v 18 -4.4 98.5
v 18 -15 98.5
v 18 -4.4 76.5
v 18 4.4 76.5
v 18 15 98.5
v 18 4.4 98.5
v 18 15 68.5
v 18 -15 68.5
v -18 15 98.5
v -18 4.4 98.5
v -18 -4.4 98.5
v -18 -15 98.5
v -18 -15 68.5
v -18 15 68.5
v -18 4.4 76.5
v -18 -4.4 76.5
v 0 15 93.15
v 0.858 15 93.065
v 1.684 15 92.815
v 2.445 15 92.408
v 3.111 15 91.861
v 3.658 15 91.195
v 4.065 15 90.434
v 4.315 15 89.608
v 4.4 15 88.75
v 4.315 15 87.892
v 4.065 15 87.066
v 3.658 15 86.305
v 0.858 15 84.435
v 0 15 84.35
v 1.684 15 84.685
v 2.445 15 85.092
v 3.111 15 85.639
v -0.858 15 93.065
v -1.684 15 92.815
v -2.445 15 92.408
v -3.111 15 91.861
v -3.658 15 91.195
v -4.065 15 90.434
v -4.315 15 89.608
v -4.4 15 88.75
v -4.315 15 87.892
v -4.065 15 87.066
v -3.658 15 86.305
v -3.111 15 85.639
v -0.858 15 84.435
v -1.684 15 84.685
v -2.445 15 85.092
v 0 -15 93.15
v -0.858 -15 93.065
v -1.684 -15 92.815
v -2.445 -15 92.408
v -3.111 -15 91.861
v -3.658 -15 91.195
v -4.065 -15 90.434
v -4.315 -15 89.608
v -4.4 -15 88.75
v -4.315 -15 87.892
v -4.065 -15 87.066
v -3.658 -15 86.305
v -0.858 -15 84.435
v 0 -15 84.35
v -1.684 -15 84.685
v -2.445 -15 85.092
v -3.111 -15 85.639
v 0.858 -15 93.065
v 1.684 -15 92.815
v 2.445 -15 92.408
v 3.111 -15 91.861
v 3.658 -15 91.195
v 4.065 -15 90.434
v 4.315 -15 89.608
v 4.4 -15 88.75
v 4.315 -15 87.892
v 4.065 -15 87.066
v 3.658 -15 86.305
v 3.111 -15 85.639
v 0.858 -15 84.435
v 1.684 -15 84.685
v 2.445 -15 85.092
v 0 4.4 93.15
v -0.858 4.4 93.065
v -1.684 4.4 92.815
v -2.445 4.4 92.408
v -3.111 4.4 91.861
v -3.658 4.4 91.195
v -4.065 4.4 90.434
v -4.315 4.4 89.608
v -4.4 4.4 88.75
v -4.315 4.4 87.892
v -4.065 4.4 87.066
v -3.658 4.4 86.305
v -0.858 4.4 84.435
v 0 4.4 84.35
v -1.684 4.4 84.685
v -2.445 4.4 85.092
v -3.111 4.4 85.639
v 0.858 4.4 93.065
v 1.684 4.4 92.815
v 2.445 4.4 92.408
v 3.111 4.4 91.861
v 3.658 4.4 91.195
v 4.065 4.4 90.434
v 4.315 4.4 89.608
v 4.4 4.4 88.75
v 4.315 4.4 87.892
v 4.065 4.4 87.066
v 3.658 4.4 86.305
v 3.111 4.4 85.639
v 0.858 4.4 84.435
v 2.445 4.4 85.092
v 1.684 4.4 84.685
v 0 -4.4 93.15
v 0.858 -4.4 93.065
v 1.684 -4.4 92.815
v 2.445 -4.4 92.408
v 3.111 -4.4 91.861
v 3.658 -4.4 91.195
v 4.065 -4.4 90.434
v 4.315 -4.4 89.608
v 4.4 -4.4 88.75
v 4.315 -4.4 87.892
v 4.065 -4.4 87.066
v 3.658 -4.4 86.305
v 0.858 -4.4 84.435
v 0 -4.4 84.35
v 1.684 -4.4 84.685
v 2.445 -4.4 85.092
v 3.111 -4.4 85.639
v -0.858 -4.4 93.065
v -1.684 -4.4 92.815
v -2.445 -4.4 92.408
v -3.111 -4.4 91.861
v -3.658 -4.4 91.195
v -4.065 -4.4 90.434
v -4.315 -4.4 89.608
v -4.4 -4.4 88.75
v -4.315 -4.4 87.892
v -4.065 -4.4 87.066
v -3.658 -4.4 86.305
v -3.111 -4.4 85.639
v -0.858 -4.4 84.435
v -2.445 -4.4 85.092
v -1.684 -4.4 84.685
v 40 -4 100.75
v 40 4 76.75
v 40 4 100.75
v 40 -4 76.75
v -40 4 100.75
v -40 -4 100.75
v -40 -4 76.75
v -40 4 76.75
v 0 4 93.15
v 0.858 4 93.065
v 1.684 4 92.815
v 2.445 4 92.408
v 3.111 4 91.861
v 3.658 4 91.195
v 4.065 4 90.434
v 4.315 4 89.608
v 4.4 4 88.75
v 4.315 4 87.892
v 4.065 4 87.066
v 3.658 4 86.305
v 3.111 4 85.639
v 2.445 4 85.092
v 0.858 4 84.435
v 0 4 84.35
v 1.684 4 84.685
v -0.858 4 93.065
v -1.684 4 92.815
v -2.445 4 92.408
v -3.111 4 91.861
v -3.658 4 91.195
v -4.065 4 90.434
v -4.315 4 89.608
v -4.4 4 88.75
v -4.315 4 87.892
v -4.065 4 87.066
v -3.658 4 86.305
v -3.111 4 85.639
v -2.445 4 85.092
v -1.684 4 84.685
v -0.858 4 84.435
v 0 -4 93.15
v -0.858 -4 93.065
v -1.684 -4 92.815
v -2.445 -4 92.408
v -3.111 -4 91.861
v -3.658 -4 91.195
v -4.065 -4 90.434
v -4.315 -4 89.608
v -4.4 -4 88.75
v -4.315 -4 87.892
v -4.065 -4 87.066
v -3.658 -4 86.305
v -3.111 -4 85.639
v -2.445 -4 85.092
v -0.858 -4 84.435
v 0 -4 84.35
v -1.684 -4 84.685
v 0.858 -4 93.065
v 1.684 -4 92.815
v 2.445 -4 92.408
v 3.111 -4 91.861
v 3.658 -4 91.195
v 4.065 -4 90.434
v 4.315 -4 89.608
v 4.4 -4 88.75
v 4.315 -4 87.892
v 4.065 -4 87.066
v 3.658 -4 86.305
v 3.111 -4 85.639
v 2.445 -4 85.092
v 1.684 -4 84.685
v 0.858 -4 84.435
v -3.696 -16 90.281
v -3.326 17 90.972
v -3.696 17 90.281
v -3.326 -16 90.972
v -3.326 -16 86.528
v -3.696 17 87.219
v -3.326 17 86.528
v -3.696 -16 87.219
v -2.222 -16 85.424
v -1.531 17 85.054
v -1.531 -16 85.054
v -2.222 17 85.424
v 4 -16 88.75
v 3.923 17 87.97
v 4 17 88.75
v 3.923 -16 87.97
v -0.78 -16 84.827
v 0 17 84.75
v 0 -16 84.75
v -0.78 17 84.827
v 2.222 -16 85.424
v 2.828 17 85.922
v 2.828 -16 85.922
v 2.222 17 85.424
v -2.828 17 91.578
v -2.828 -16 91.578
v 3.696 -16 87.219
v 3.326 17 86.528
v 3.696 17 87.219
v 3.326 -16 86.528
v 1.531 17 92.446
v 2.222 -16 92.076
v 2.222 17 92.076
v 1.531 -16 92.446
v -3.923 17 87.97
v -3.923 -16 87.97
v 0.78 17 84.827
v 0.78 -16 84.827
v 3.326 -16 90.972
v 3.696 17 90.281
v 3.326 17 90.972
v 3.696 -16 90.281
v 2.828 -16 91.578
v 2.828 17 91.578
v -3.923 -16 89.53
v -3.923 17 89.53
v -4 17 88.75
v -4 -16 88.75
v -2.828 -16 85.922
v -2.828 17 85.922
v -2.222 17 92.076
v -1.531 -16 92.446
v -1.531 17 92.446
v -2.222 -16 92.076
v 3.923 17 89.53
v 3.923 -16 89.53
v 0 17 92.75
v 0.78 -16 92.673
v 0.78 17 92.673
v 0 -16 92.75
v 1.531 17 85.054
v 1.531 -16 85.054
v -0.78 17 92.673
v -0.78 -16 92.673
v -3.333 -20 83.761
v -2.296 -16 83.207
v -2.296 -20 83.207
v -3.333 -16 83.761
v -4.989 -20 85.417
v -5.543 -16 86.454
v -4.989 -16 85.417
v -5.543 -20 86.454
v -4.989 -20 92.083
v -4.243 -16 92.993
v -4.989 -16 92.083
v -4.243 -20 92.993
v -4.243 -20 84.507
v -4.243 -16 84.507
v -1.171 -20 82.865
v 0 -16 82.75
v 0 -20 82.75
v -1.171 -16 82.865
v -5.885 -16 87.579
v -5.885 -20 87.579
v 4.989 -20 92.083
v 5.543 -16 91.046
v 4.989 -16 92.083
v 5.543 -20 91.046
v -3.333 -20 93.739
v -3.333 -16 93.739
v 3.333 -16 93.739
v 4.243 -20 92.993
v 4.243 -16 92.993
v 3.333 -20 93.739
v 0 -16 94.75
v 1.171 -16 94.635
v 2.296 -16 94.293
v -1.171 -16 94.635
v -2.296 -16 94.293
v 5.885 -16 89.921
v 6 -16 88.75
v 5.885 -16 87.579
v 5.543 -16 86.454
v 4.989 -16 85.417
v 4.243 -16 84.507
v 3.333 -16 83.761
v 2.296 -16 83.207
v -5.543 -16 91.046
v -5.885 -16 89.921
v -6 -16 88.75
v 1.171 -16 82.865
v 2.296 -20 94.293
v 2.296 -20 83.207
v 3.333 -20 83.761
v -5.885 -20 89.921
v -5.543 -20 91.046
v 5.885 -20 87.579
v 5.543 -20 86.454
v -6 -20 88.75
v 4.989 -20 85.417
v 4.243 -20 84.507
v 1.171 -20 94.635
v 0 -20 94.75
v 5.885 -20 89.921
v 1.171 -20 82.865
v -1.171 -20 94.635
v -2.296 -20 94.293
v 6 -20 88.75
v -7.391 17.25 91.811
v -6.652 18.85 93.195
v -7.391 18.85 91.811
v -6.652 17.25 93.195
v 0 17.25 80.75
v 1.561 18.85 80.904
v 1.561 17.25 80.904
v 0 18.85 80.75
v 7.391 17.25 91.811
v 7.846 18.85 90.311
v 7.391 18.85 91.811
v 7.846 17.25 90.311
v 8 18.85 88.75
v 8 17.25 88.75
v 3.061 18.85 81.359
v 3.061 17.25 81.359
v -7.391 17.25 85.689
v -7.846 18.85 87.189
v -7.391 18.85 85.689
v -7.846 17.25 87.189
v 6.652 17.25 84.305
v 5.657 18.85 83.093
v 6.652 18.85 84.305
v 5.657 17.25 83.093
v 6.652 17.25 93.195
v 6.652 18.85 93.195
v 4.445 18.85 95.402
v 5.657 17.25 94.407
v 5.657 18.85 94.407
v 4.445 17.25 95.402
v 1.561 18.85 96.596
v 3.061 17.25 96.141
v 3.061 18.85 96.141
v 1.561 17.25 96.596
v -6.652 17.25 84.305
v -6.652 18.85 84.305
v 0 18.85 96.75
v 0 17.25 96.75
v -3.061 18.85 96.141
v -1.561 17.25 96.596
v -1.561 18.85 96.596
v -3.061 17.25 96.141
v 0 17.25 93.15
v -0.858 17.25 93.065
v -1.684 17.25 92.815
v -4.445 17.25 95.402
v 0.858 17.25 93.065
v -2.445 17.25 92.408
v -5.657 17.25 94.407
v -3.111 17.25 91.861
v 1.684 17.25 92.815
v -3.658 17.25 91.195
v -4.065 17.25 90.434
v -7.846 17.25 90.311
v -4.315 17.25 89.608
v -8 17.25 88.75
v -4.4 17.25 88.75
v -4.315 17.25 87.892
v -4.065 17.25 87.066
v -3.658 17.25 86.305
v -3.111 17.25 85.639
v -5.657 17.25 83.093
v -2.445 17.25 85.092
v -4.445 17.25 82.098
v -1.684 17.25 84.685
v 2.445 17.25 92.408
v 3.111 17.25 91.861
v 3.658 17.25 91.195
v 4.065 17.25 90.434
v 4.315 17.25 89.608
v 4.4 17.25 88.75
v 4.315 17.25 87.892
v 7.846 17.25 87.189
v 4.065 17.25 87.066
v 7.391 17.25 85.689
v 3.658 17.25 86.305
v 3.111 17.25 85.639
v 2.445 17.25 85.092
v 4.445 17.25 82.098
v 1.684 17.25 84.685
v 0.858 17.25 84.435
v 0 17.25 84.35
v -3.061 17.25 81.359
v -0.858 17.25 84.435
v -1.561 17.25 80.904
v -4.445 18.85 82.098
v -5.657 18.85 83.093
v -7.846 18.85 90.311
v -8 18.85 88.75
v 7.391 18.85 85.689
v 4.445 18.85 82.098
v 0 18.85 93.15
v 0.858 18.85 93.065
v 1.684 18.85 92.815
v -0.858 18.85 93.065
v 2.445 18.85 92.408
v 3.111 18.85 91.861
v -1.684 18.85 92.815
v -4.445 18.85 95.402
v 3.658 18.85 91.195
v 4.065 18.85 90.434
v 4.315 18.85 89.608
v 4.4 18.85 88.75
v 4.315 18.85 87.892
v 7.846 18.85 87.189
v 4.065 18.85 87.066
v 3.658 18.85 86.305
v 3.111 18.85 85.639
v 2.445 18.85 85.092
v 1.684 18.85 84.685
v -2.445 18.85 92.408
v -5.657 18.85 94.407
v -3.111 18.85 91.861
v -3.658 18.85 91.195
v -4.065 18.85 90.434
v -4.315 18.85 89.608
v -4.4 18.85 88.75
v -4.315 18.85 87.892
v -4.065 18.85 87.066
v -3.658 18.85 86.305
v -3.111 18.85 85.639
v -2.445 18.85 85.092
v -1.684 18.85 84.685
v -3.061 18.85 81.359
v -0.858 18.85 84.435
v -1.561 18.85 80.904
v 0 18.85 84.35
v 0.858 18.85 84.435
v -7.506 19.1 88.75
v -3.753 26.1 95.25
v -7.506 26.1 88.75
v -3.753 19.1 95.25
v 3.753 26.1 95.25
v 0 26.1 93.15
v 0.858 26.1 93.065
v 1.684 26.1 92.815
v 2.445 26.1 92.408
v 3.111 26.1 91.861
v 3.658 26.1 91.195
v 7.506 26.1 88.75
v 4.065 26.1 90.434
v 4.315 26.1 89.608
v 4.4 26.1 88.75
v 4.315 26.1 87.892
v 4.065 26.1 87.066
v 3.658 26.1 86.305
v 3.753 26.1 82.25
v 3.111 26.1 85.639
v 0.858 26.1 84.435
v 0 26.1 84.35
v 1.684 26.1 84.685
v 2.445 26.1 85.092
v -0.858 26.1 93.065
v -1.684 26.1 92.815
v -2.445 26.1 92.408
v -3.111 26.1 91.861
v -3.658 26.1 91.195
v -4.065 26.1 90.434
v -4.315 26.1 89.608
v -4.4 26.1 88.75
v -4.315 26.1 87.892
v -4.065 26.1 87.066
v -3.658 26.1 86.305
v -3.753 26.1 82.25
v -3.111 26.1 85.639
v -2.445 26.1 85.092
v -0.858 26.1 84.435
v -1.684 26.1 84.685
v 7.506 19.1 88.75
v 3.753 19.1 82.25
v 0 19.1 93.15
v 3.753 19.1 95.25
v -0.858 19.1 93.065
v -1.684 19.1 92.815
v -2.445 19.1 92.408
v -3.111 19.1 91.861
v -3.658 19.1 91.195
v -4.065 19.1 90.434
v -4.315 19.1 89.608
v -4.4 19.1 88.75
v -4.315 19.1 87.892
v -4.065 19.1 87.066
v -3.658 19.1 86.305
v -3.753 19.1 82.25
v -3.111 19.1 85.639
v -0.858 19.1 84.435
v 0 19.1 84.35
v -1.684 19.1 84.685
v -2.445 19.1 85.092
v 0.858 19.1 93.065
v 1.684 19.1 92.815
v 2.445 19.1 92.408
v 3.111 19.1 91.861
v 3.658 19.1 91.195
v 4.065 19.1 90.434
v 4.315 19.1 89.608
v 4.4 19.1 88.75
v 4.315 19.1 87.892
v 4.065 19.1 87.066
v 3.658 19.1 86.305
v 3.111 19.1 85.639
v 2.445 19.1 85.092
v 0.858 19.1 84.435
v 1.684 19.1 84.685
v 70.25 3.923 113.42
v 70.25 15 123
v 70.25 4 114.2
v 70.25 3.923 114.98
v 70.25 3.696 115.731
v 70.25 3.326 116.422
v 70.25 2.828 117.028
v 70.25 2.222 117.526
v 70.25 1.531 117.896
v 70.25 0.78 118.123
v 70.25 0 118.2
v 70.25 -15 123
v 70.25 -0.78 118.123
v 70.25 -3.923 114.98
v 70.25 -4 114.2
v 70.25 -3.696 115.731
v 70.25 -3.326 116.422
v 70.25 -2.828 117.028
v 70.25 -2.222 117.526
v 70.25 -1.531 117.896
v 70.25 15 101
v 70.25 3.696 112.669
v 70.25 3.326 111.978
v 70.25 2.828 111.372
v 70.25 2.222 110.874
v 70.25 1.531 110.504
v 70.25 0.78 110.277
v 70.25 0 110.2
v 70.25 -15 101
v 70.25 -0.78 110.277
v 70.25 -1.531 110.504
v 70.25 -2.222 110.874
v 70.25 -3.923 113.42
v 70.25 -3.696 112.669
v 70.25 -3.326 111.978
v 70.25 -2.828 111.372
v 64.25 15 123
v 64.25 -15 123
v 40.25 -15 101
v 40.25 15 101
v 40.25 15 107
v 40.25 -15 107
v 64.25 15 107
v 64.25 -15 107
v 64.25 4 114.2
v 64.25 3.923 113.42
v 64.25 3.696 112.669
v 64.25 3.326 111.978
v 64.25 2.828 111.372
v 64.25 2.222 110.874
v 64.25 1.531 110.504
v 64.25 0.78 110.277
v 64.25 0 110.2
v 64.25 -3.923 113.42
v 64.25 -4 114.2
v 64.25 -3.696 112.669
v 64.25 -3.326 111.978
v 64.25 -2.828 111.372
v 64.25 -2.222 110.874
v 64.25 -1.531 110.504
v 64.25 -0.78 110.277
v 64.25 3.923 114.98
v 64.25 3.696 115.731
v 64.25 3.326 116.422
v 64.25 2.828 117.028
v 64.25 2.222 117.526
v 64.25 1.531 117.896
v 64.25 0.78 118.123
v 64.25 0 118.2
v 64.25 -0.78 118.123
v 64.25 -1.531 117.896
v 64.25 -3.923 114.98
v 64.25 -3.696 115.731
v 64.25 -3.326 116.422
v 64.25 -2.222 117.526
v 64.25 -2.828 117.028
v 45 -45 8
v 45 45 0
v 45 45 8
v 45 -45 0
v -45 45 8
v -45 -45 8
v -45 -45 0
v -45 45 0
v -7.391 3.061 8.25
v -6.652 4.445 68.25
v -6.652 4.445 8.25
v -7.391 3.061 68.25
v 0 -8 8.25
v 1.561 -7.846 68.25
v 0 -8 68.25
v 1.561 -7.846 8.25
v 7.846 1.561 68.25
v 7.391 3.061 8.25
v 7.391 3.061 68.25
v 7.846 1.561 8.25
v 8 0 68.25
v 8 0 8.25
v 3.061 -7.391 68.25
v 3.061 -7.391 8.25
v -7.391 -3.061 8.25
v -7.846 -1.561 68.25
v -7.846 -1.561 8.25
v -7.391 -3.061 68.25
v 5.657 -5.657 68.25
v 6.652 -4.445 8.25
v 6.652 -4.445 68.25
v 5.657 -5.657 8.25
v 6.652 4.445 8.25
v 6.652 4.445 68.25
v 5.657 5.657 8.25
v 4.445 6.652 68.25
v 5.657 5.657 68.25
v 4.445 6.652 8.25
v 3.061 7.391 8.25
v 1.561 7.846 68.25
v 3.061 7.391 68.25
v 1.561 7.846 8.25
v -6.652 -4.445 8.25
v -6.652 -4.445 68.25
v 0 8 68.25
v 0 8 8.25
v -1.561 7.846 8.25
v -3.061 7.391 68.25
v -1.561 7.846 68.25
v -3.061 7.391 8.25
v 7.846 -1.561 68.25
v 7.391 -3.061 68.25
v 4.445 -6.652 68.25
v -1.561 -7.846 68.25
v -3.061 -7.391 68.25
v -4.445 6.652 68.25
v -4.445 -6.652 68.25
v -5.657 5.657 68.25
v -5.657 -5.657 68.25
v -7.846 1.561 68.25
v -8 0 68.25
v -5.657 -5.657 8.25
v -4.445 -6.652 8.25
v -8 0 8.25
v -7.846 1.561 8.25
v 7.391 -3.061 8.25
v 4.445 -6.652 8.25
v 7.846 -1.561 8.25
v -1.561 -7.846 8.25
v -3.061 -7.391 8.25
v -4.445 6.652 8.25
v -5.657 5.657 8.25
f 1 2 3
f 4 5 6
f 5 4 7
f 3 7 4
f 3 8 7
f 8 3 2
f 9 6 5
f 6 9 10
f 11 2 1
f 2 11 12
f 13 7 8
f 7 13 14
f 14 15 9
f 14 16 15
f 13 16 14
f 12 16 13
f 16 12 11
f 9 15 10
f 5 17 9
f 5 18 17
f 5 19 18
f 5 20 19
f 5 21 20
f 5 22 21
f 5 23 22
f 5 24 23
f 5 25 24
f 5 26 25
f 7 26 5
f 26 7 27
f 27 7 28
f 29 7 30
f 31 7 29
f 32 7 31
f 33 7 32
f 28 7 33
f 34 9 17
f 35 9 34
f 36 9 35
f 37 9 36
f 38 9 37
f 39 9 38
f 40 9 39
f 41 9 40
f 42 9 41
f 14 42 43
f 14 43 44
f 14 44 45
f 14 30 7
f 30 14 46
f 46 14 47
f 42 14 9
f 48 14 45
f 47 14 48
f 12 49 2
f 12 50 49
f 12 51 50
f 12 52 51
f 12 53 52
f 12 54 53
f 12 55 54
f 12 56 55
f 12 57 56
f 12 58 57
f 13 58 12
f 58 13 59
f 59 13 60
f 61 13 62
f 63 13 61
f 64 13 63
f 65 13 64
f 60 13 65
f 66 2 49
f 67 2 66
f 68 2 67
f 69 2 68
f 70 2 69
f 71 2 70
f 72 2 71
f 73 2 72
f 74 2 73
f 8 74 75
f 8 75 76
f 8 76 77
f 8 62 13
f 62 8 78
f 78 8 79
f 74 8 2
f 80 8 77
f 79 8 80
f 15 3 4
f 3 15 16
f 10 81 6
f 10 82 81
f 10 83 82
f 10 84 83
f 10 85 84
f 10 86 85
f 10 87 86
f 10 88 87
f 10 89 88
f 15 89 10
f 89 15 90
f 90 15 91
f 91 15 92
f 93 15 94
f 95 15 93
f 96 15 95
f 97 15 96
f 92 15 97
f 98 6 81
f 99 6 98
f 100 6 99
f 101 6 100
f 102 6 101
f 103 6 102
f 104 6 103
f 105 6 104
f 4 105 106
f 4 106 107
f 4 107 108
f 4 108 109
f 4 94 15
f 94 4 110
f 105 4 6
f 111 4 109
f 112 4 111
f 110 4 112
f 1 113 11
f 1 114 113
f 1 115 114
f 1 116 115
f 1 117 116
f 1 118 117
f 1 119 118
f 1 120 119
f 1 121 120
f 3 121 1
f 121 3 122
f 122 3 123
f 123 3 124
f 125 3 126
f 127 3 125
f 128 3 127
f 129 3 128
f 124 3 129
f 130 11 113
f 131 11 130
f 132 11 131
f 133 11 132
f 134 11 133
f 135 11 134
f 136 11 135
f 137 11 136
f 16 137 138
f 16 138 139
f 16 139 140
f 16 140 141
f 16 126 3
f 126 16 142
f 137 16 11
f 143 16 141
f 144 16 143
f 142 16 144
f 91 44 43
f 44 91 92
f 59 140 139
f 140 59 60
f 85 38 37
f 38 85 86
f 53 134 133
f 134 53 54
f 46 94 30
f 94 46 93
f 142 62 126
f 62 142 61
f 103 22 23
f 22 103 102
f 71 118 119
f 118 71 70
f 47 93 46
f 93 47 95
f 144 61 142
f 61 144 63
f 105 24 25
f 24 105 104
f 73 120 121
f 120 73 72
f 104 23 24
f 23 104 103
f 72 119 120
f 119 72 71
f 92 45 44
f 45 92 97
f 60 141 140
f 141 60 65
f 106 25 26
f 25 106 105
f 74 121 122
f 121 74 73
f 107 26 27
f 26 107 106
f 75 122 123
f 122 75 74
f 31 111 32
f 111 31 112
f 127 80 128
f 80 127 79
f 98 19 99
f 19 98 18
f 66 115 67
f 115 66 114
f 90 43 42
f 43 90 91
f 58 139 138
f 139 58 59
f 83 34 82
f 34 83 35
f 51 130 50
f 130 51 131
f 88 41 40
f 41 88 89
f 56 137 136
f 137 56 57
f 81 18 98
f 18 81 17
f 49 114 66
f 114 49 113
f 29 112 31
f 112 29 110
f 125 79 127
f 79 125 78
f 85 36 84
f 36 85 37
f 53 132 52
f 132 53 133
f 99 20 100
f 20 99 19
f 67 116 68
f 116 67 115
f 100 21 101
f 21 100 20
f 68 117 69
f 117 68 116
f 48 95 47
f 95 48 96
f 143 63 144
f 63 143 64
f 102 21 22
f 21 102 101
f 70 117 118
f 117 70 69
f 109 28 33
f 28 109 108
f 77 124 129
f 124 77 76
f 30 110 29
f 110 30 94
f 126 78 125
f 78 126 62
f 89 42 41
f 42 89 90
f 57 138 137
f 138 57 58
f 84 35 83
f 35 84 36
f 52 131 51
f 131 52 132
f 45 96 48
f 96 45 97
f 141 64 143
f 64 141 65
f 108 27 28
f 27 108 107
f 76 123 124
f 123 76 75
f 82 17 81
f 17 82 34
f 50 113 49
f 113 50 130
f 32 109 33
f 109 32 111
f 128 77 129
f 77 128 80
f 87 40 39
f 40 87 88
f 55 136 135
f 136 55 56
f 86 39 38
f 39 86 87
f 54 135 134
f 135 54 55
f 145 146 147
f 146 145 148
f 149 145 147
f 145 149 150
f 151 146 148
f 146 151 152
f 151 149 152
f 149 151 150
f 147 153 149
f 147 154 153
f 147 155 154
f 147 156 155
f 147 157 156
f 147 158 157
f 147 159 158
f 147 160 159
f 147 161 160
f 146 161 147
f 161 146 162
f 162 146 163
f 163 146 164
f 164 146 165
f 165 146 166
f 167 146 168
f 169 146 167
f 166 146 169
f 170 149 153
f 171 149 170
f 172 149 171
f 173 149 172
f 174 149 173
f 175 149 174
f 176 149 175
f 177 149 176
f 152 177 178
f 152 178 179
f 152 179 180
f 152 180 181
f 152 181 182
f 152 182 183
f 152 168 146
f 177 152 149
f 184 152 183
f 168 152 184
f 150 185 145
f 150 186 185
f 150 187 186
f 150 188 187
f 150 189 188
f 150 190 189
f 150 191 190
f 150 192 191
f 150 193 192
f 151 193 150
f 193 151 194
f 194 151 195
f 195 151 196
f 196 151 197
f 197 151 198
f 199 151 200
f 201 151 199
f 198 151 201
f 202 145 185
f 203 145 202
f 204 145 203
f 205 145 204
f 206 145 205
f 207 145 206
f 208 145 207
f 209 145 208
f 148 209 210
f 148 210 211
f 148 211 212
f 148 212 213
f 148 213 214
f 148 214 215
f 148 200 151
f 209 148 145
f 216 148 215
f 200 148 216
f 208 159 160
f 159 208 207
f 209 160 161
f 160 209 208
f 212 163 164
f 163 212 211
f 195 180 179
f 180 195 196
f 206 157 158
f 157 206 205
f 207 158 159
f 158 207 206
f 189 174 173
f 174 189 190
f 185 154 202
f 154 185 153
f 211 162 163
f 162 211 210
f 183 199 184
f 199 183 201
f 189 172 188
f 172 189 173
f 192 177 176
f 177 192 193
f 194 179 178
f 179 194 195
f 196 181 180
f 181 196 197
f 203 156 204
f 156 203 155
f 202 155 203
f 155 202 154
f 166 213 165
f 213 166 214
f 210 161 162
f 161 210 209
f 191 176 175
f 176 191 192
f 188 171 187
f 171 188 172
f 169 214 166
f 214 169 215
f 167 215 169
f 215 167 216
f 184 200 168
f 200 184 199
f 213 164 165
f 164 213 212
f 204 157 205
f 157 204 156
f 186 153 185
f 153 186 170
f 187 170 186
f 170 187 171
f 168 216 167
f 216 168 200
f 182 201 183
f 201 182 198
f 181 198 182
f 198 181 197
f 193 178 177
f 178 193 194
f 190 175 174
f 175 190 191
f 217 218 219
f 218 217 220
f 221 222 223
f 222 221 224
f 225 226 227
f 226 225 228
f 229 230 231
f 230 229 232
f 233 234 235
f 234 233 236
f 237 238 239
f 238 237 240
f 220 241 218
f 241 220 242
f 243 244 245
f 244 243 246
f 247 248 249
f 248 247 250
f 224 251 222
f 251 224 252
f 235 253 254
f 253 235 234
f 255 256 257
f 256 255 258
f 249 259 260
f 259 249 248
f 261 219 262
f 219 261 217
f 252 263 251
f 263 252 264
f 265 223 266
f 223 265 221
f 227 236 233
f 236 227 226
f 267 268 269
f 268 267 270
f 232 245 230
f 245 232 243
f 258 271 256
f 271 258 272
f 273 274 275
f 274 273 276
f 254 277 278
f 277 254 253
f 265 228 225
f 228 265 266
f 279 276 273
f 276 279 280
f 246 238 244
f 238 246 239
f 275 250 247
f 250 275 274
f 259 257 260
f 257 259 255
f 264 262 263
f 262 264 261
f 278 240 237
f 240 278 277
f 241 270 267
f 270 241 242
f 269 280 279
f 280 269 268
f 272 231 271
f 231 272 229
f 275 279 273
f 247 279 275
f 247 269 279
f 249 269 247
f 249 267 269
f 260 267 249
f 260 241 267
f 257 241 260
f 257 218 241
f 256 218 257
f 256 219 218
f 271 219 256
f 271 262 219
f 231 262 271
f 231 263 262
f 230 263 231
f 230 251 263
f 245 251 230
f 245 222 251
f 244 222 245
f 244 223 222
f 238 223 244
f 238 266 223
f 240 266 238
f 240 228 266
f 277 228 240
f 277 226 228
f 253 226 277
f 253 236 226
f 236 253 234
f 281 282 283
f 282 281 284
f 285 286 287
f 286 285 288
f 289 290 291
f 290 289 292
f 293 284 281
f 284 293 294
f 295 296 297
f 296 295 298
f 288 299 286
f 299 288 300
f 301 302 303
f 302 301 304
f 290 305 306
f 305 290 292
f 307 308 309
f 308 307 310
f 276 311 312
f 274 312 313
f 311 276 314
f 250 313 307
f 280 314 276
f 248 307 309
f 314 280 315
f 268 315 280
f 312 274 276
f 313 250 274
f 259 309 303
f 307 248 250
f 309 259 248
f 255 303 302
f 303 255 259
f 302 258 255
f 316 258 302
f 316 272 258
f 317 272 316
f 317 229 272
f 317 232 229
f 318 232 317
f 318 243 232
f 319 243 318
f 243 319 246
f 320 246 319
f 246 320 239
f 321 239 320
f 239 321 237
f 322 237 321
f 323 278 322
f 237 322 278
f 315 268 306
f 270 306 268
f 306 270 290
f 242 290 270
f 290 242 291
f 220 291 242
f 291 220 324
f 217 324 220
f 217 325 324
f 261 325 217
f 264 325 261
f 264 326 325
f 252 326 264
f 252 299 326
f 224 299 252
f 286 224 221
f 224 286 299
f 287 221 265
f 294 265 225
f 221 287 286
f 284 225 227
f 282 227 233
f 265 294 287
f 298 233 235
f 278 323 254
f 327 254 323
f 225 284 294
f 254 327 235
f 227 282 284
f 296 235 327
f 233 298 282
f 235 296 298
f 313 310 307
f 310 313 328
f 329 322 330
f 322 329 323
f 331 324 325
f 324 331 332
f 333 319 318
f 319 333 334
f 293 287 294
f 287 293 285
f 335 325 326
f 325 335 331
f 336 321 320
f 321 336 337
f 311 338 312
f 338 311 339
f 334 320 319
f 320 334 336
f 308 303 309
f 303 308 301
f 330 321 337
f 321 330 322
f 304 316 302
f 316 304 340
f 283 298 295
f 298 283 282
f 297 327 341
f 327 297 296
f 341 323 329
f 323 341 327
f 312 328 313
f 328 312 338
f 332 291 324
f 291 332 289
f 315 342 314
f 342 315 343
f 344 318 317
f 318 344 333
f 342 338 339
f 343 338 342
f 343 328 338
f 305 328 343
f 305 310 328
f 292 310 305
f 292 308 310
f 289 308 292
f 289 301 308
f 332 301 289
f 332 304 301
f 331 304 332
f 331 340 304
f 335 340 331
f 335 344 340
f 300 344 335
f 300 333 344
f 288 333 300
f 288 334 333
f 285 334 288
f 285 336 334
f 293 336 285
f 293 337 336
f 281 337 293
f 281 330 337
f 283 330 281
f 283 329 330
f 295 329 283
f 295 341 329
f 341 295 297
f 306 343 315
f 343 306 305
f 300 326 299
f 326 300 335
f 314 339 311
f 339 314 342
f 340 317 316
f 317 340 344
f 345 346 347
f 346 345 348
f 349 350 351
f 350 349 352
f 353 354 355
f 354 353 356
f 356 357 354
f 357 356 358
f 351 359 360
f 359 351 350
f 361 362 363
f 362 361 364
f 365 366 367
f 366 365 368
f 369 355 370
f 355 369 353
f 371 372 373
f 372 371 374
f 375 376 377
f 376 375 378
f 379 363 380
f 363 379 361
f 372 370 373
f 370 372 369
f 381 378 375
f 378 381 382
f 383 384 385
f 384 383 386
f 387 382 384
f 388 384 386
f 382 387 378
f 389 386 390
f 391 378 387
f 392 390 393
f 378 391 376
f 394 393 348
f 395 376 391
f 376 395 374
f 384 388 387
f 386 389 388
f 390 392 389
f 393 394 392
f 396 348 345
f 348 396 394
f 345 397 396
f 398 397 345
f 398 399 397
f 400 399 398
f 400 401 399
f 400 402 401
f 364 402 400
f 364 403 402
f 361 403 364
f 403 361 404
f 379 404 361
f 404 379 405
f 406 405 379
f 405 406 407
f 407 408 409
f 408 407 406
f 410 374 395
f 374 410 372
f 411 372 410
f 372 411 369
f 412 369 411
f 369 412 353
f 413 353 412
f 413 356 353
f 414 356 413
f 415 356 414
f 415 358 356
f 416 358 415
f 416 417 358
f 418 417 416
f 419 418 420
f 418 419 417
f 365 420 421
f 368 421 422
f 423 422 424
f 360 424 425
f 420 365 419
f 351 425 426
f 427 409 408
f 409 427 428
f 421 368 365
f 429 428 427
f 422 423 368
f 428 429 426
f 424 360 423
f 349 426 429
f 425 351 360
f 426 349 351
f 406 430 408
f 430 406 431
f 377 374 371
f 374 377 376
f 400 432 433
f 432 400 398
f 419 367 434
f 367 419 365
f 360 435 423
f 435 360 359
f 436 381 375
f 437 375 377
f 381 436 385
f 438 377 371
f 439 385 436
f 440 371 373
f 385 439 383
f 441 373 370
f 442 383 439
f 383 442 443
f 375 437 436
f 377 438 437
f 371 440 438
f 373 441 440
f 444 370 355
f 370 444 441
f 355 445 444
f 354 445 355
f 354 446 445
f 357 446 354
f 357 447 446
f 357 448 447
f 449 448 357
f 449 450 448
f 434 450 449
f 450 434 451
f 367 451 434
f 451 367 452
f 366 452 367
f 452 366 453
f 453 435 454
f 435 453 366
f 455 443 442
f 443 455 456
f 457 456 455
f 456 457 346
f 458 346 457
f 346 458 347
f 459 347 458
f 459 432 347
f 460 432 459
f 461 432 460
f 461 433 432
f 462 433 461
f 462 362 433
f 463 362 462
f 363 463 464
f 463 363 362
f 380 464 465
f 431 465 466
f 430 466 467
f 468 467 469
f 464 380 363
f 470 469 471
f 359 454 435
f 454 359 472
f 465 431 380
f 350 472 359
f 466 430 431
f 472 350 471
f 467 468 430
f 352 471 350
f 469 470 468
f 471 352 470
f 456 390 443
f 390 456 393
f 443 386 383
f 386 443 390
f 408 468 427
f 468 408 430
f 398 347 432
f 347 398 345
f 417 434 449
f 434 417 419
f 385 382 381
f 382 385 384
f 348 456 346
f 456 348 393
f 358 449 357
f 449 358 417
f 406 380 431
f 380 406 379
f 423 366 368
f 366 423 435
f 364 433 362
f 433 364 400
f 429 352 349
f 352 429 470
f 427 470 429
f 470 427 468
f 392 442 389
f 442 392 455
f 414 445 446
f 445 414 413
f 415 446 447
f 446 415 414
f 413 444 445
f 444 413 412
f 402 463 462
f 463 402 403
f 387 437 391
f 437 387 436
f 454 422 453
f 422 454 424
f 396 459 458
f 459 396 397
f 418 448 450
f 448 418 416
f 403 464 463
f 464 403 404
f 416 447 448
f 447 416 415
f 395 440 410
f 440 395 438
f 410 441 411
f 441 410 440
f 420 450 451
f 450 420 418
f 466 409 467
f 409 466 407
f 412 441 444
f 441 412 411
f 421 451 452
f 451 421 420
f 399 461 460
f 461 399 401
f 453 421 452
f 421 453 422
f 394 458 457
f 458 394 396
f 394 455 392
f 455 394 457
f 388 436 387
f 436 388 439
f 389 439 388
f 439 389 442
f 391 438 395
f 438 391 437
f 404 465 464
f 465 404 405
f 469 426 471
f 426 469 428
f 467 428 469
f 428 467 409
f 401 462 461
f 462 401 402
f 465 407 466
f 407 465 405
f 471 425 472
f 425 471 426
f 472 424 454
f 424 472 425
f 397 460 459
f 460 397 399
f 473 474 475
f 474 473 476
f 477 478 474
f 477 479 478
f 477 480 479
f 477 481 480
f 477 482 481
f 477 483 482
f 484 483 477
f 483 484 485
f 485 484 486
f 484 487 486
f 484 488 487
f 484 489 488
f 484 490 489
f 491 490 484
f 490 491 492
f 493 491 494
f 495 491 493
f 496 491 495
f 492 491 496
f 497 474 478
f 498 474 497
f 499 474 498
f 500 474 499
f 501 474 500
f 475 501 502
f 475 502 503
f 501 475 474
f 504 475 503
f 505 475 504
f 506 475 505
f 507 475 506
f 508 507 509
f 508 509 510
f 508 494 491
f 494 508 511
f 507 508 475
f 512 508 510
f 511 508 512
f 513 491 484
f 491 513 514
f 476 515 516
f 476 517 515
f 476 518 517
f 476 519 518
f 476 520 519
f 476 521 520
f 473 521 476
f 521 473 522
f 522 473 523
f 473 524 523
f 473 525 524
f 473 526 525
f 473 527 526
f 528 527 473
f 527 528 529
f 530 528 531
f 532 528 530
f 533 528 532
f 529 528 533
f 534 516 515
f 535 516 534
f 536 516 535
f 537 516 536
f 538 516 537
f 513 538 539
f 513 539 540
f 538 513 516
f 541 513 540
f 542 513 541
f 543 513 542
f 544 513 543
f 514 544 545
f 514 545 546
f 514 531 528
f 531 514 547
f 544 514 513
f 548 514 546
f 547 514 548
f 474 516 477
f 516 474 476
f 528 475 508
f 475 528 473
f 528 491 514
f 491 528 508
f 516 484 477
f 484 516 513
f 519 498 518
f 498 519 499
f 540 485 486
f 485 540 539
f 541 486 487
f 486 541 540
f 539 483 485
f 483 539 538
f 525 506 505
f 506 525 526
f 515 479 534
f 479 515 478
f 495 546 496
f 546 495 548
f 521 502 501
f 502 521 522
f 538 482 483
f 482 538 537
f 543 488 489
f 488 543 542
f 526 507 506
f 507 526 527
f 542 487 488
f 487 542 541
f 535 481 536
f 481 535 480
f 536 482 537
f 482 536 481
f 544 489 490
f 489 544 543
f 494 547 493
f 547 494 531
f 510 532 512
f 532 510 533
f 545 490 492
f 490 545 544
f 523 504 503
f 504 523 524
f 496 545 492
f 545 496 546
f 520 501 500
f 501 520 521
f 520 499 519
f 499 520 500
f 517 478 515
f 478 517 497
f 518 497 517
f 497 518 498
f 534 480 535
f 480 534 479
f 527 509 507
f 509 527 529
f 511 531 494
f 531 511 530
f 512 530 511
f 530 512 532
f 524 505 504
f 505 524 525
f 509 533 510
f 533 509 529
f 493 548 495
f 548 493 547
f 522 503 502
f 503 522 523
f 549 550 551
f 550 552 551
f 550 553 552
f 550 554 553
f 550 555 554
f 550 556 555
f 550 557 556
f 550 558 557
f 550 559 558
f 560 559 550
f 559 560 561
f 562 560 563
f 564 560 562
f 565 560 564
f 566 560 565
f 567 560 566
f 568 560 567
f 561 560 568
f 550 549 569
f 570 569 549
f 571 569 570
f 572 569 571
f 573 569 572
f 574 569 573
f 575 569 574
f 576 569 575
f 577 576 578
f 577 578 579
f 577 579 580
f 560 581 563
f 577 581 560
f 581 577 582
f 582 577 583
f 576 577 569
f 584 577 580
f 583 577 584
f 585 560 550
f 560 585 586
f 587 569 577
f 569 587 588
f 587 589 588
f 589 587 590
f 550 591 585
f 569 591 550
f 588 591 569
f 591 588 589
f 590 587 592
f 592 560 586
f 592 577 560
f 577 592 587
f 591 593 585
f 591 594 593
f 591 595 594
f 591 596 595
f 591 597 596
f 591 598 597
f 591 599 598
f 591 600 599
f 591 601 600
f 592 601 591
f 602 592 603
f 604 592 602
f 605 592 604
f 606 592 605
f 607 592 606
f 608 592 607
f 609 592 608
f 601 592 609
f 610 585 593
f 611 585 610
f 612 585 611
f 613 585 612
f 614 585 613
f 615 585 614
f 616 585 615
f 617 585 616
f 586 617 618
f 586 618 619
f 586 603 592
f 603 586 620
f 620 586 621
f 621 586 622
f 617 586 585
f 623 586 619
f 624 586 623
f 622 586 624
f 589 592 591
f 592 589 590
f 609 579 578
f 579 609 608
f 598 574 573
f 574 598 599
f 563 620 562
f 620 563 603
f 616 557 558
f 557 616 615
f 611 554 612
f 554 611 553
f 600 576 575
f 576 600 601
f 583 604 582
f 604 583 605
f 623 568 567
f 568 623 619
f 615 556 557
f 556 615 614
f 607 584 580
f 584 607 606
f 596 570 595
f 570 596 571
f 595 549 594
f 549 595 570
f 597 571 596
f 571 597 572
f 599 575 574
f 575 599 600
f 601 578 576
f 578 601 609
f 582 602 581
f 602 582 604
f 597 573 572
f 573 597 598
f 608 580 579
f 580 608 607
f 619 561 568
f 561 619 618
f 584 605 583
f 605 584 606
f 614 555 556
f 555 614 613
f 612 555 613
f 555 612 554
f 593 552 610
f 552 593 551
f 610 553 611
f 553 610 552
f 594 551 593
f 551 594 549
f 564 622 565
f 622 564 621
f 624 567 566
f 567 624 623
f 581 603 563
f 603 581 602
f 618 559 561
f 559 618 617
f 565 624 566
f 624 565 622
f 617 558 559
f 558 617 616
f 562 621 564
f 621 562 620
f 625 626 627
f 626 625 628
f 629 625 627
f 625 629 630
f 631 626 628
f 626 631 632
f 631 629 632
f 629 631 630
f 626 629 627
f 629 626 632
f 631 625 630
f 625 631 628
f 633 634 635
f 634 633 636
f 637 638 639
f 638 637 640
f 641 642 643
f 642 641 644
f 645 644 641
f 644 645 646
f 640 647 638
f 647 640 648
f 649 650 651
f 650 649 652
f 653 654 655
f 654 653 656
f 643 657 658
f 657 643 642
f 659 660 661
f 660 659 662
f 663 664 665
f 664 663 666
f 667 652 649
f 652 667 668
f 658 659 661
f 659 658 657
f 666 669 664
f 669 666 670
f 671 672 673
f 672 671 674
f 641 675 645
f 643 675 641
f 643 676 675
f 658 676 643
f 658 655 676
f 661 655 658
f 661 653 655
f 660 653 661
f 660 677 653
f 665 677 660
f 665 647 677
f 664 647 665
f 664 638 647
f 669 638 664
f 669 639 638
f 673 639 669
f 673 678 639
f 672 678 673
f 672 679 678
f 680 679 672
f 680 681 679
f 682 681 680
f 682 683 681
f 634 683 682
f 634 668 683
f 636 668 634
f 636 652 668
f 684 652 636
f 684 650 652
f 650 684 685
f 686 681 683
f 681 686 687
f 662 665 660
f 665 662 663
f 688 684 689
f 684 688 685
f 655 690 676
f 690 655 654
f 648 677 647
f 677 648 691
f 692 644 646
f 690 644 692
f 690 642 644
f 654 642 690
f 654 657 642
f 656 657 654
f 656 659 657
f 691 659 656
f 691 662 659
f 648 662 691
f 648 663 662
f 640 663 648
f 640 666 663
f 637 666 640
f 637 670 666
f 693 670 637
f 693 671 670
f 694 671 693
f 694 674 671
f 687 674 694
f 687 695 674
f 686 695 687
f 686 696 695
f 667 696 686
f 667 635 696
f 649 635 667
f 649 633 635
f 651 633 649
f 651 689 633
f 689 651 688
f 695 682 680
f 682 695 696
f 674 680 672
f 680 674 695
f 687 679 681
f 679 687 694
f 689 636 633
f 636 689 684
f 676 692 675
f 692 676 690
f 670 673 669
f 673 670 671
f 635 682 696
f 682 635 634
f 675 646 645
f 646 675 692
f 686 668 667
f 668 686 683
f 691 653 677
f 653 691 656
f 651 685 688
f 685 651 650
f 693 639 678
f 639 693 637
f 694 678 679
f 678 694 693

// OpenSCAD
$fn = 32;

// ------------------------------------------------------------------------
// Lamp arm: column d16 x 60 mm, arm 80 mm
// Every part is its own module, assembly() places every instance.
// ------------------------------------------------------------------------

// --- part 1 ---
module lamp_base() {
  difference() {
    translate([-45, -45, 0]) cube([90, 90, 8]);
  }
}

// --- part 2 ---
module lamp_column() {
  cylinder(h = 60, d = 16);
}

// --- part 3 ---
module head_fork() {
  difference() {
    translate([-18, -15, 0]) cube([36, 30, 30]);
    translate([-19, -4.4, 8]) cube([38, 8.8, 23]);
    translate([0, 0, 20.25]) rotate([90, 0, 0]) cylinder(h = 32, d = 8.8, center = true);
  }
}

// --- part 4 ---
module lamp_arm() {
  difference() {
    translate([-40, -4, 0]) cube([80, 8, 24]);
    translate([0, 0, 12]) rotate([90, 0, 0]) cylinder(h = 10, d = 8.8, center = true);
  }
}

// --- part 5 ---
module arm_pin() {
  rotate([0, 90, 0]) cylinder(h = 34, d = 8, center = true);
  translate([-20, 0, 0]) rotate([0, 90, 0]) cylinder(h = 4, d = 12);
}

// --- part 6 ---
module arm_washer() {
  difference() {
      translate([0, 0, 0]) cylinder(h = 1.6, d = 16);
      translate([0, 0, -1]) cylinder(h = 3.6, d = 8.8);
    }
}

// --- part 7 ---
module arm_nut() {
  difference() {
    linear_extrude(height = 7) polygon(points = [[7.506, 0], [3.753, 6.5], [-3.753, 6.5], [-7.506, 0], [-3.753, -6.5], [3.753, -6.5]]);
    translate([0, 0, -1]) cylinder(h = 9, d = 8.8);
  }
}

// --- part 8 ---
module shade_bracket() {
  difference() {
    translate([-15, -15, 0]) cube([30, 30, 22]);
    translate([-16, -16, 6]) cube([25, 32, 17]);
    translate([12, 0, 13.2]) rotate([0, 90, 0]) cylinder(h = 8, d = 8, center = true);
  }
}

// --- assembly ---
module assembly() {
  color([0.80, 0.24, 0.20]) translate([0, 0, 0]) rotate([0, 0, 0]) lamp_base();
  color([0.20, 0.45, 0.75]) translate([0, 0, 8.25]) rotate([0, 0, 0]) lamp_column();
  color([0.25, 0.62, 0.32]) translate([0, 0, 68.5]) rotate([0, 0, 0]) head_fork();
  color([0.92, 0.70, 0.18]) translate([0, 0, 76.75]) rotate([0, 0, 0]) lamp_arm();
  color([0.58, 0.35, 0.70]) translate([0, 0, 88.75]) rotate([0, 0, 90]) arm_pin();
  color([0.16, 0.66, 0.66]) translate([0, 18.85, 88.75]) rotate([90, 0, 0]) arm_washer();
  color([0.85, 0.48, 0.18]) translate([0, 26.1, 88.75]) rotate([90, 0, 0]) arm_nut();
  color([0.55, 0.60, 0.65]) translate([55.25, 0, 101]) rotate([0, 0, 0]) shade_bracket();
}

assembly();
